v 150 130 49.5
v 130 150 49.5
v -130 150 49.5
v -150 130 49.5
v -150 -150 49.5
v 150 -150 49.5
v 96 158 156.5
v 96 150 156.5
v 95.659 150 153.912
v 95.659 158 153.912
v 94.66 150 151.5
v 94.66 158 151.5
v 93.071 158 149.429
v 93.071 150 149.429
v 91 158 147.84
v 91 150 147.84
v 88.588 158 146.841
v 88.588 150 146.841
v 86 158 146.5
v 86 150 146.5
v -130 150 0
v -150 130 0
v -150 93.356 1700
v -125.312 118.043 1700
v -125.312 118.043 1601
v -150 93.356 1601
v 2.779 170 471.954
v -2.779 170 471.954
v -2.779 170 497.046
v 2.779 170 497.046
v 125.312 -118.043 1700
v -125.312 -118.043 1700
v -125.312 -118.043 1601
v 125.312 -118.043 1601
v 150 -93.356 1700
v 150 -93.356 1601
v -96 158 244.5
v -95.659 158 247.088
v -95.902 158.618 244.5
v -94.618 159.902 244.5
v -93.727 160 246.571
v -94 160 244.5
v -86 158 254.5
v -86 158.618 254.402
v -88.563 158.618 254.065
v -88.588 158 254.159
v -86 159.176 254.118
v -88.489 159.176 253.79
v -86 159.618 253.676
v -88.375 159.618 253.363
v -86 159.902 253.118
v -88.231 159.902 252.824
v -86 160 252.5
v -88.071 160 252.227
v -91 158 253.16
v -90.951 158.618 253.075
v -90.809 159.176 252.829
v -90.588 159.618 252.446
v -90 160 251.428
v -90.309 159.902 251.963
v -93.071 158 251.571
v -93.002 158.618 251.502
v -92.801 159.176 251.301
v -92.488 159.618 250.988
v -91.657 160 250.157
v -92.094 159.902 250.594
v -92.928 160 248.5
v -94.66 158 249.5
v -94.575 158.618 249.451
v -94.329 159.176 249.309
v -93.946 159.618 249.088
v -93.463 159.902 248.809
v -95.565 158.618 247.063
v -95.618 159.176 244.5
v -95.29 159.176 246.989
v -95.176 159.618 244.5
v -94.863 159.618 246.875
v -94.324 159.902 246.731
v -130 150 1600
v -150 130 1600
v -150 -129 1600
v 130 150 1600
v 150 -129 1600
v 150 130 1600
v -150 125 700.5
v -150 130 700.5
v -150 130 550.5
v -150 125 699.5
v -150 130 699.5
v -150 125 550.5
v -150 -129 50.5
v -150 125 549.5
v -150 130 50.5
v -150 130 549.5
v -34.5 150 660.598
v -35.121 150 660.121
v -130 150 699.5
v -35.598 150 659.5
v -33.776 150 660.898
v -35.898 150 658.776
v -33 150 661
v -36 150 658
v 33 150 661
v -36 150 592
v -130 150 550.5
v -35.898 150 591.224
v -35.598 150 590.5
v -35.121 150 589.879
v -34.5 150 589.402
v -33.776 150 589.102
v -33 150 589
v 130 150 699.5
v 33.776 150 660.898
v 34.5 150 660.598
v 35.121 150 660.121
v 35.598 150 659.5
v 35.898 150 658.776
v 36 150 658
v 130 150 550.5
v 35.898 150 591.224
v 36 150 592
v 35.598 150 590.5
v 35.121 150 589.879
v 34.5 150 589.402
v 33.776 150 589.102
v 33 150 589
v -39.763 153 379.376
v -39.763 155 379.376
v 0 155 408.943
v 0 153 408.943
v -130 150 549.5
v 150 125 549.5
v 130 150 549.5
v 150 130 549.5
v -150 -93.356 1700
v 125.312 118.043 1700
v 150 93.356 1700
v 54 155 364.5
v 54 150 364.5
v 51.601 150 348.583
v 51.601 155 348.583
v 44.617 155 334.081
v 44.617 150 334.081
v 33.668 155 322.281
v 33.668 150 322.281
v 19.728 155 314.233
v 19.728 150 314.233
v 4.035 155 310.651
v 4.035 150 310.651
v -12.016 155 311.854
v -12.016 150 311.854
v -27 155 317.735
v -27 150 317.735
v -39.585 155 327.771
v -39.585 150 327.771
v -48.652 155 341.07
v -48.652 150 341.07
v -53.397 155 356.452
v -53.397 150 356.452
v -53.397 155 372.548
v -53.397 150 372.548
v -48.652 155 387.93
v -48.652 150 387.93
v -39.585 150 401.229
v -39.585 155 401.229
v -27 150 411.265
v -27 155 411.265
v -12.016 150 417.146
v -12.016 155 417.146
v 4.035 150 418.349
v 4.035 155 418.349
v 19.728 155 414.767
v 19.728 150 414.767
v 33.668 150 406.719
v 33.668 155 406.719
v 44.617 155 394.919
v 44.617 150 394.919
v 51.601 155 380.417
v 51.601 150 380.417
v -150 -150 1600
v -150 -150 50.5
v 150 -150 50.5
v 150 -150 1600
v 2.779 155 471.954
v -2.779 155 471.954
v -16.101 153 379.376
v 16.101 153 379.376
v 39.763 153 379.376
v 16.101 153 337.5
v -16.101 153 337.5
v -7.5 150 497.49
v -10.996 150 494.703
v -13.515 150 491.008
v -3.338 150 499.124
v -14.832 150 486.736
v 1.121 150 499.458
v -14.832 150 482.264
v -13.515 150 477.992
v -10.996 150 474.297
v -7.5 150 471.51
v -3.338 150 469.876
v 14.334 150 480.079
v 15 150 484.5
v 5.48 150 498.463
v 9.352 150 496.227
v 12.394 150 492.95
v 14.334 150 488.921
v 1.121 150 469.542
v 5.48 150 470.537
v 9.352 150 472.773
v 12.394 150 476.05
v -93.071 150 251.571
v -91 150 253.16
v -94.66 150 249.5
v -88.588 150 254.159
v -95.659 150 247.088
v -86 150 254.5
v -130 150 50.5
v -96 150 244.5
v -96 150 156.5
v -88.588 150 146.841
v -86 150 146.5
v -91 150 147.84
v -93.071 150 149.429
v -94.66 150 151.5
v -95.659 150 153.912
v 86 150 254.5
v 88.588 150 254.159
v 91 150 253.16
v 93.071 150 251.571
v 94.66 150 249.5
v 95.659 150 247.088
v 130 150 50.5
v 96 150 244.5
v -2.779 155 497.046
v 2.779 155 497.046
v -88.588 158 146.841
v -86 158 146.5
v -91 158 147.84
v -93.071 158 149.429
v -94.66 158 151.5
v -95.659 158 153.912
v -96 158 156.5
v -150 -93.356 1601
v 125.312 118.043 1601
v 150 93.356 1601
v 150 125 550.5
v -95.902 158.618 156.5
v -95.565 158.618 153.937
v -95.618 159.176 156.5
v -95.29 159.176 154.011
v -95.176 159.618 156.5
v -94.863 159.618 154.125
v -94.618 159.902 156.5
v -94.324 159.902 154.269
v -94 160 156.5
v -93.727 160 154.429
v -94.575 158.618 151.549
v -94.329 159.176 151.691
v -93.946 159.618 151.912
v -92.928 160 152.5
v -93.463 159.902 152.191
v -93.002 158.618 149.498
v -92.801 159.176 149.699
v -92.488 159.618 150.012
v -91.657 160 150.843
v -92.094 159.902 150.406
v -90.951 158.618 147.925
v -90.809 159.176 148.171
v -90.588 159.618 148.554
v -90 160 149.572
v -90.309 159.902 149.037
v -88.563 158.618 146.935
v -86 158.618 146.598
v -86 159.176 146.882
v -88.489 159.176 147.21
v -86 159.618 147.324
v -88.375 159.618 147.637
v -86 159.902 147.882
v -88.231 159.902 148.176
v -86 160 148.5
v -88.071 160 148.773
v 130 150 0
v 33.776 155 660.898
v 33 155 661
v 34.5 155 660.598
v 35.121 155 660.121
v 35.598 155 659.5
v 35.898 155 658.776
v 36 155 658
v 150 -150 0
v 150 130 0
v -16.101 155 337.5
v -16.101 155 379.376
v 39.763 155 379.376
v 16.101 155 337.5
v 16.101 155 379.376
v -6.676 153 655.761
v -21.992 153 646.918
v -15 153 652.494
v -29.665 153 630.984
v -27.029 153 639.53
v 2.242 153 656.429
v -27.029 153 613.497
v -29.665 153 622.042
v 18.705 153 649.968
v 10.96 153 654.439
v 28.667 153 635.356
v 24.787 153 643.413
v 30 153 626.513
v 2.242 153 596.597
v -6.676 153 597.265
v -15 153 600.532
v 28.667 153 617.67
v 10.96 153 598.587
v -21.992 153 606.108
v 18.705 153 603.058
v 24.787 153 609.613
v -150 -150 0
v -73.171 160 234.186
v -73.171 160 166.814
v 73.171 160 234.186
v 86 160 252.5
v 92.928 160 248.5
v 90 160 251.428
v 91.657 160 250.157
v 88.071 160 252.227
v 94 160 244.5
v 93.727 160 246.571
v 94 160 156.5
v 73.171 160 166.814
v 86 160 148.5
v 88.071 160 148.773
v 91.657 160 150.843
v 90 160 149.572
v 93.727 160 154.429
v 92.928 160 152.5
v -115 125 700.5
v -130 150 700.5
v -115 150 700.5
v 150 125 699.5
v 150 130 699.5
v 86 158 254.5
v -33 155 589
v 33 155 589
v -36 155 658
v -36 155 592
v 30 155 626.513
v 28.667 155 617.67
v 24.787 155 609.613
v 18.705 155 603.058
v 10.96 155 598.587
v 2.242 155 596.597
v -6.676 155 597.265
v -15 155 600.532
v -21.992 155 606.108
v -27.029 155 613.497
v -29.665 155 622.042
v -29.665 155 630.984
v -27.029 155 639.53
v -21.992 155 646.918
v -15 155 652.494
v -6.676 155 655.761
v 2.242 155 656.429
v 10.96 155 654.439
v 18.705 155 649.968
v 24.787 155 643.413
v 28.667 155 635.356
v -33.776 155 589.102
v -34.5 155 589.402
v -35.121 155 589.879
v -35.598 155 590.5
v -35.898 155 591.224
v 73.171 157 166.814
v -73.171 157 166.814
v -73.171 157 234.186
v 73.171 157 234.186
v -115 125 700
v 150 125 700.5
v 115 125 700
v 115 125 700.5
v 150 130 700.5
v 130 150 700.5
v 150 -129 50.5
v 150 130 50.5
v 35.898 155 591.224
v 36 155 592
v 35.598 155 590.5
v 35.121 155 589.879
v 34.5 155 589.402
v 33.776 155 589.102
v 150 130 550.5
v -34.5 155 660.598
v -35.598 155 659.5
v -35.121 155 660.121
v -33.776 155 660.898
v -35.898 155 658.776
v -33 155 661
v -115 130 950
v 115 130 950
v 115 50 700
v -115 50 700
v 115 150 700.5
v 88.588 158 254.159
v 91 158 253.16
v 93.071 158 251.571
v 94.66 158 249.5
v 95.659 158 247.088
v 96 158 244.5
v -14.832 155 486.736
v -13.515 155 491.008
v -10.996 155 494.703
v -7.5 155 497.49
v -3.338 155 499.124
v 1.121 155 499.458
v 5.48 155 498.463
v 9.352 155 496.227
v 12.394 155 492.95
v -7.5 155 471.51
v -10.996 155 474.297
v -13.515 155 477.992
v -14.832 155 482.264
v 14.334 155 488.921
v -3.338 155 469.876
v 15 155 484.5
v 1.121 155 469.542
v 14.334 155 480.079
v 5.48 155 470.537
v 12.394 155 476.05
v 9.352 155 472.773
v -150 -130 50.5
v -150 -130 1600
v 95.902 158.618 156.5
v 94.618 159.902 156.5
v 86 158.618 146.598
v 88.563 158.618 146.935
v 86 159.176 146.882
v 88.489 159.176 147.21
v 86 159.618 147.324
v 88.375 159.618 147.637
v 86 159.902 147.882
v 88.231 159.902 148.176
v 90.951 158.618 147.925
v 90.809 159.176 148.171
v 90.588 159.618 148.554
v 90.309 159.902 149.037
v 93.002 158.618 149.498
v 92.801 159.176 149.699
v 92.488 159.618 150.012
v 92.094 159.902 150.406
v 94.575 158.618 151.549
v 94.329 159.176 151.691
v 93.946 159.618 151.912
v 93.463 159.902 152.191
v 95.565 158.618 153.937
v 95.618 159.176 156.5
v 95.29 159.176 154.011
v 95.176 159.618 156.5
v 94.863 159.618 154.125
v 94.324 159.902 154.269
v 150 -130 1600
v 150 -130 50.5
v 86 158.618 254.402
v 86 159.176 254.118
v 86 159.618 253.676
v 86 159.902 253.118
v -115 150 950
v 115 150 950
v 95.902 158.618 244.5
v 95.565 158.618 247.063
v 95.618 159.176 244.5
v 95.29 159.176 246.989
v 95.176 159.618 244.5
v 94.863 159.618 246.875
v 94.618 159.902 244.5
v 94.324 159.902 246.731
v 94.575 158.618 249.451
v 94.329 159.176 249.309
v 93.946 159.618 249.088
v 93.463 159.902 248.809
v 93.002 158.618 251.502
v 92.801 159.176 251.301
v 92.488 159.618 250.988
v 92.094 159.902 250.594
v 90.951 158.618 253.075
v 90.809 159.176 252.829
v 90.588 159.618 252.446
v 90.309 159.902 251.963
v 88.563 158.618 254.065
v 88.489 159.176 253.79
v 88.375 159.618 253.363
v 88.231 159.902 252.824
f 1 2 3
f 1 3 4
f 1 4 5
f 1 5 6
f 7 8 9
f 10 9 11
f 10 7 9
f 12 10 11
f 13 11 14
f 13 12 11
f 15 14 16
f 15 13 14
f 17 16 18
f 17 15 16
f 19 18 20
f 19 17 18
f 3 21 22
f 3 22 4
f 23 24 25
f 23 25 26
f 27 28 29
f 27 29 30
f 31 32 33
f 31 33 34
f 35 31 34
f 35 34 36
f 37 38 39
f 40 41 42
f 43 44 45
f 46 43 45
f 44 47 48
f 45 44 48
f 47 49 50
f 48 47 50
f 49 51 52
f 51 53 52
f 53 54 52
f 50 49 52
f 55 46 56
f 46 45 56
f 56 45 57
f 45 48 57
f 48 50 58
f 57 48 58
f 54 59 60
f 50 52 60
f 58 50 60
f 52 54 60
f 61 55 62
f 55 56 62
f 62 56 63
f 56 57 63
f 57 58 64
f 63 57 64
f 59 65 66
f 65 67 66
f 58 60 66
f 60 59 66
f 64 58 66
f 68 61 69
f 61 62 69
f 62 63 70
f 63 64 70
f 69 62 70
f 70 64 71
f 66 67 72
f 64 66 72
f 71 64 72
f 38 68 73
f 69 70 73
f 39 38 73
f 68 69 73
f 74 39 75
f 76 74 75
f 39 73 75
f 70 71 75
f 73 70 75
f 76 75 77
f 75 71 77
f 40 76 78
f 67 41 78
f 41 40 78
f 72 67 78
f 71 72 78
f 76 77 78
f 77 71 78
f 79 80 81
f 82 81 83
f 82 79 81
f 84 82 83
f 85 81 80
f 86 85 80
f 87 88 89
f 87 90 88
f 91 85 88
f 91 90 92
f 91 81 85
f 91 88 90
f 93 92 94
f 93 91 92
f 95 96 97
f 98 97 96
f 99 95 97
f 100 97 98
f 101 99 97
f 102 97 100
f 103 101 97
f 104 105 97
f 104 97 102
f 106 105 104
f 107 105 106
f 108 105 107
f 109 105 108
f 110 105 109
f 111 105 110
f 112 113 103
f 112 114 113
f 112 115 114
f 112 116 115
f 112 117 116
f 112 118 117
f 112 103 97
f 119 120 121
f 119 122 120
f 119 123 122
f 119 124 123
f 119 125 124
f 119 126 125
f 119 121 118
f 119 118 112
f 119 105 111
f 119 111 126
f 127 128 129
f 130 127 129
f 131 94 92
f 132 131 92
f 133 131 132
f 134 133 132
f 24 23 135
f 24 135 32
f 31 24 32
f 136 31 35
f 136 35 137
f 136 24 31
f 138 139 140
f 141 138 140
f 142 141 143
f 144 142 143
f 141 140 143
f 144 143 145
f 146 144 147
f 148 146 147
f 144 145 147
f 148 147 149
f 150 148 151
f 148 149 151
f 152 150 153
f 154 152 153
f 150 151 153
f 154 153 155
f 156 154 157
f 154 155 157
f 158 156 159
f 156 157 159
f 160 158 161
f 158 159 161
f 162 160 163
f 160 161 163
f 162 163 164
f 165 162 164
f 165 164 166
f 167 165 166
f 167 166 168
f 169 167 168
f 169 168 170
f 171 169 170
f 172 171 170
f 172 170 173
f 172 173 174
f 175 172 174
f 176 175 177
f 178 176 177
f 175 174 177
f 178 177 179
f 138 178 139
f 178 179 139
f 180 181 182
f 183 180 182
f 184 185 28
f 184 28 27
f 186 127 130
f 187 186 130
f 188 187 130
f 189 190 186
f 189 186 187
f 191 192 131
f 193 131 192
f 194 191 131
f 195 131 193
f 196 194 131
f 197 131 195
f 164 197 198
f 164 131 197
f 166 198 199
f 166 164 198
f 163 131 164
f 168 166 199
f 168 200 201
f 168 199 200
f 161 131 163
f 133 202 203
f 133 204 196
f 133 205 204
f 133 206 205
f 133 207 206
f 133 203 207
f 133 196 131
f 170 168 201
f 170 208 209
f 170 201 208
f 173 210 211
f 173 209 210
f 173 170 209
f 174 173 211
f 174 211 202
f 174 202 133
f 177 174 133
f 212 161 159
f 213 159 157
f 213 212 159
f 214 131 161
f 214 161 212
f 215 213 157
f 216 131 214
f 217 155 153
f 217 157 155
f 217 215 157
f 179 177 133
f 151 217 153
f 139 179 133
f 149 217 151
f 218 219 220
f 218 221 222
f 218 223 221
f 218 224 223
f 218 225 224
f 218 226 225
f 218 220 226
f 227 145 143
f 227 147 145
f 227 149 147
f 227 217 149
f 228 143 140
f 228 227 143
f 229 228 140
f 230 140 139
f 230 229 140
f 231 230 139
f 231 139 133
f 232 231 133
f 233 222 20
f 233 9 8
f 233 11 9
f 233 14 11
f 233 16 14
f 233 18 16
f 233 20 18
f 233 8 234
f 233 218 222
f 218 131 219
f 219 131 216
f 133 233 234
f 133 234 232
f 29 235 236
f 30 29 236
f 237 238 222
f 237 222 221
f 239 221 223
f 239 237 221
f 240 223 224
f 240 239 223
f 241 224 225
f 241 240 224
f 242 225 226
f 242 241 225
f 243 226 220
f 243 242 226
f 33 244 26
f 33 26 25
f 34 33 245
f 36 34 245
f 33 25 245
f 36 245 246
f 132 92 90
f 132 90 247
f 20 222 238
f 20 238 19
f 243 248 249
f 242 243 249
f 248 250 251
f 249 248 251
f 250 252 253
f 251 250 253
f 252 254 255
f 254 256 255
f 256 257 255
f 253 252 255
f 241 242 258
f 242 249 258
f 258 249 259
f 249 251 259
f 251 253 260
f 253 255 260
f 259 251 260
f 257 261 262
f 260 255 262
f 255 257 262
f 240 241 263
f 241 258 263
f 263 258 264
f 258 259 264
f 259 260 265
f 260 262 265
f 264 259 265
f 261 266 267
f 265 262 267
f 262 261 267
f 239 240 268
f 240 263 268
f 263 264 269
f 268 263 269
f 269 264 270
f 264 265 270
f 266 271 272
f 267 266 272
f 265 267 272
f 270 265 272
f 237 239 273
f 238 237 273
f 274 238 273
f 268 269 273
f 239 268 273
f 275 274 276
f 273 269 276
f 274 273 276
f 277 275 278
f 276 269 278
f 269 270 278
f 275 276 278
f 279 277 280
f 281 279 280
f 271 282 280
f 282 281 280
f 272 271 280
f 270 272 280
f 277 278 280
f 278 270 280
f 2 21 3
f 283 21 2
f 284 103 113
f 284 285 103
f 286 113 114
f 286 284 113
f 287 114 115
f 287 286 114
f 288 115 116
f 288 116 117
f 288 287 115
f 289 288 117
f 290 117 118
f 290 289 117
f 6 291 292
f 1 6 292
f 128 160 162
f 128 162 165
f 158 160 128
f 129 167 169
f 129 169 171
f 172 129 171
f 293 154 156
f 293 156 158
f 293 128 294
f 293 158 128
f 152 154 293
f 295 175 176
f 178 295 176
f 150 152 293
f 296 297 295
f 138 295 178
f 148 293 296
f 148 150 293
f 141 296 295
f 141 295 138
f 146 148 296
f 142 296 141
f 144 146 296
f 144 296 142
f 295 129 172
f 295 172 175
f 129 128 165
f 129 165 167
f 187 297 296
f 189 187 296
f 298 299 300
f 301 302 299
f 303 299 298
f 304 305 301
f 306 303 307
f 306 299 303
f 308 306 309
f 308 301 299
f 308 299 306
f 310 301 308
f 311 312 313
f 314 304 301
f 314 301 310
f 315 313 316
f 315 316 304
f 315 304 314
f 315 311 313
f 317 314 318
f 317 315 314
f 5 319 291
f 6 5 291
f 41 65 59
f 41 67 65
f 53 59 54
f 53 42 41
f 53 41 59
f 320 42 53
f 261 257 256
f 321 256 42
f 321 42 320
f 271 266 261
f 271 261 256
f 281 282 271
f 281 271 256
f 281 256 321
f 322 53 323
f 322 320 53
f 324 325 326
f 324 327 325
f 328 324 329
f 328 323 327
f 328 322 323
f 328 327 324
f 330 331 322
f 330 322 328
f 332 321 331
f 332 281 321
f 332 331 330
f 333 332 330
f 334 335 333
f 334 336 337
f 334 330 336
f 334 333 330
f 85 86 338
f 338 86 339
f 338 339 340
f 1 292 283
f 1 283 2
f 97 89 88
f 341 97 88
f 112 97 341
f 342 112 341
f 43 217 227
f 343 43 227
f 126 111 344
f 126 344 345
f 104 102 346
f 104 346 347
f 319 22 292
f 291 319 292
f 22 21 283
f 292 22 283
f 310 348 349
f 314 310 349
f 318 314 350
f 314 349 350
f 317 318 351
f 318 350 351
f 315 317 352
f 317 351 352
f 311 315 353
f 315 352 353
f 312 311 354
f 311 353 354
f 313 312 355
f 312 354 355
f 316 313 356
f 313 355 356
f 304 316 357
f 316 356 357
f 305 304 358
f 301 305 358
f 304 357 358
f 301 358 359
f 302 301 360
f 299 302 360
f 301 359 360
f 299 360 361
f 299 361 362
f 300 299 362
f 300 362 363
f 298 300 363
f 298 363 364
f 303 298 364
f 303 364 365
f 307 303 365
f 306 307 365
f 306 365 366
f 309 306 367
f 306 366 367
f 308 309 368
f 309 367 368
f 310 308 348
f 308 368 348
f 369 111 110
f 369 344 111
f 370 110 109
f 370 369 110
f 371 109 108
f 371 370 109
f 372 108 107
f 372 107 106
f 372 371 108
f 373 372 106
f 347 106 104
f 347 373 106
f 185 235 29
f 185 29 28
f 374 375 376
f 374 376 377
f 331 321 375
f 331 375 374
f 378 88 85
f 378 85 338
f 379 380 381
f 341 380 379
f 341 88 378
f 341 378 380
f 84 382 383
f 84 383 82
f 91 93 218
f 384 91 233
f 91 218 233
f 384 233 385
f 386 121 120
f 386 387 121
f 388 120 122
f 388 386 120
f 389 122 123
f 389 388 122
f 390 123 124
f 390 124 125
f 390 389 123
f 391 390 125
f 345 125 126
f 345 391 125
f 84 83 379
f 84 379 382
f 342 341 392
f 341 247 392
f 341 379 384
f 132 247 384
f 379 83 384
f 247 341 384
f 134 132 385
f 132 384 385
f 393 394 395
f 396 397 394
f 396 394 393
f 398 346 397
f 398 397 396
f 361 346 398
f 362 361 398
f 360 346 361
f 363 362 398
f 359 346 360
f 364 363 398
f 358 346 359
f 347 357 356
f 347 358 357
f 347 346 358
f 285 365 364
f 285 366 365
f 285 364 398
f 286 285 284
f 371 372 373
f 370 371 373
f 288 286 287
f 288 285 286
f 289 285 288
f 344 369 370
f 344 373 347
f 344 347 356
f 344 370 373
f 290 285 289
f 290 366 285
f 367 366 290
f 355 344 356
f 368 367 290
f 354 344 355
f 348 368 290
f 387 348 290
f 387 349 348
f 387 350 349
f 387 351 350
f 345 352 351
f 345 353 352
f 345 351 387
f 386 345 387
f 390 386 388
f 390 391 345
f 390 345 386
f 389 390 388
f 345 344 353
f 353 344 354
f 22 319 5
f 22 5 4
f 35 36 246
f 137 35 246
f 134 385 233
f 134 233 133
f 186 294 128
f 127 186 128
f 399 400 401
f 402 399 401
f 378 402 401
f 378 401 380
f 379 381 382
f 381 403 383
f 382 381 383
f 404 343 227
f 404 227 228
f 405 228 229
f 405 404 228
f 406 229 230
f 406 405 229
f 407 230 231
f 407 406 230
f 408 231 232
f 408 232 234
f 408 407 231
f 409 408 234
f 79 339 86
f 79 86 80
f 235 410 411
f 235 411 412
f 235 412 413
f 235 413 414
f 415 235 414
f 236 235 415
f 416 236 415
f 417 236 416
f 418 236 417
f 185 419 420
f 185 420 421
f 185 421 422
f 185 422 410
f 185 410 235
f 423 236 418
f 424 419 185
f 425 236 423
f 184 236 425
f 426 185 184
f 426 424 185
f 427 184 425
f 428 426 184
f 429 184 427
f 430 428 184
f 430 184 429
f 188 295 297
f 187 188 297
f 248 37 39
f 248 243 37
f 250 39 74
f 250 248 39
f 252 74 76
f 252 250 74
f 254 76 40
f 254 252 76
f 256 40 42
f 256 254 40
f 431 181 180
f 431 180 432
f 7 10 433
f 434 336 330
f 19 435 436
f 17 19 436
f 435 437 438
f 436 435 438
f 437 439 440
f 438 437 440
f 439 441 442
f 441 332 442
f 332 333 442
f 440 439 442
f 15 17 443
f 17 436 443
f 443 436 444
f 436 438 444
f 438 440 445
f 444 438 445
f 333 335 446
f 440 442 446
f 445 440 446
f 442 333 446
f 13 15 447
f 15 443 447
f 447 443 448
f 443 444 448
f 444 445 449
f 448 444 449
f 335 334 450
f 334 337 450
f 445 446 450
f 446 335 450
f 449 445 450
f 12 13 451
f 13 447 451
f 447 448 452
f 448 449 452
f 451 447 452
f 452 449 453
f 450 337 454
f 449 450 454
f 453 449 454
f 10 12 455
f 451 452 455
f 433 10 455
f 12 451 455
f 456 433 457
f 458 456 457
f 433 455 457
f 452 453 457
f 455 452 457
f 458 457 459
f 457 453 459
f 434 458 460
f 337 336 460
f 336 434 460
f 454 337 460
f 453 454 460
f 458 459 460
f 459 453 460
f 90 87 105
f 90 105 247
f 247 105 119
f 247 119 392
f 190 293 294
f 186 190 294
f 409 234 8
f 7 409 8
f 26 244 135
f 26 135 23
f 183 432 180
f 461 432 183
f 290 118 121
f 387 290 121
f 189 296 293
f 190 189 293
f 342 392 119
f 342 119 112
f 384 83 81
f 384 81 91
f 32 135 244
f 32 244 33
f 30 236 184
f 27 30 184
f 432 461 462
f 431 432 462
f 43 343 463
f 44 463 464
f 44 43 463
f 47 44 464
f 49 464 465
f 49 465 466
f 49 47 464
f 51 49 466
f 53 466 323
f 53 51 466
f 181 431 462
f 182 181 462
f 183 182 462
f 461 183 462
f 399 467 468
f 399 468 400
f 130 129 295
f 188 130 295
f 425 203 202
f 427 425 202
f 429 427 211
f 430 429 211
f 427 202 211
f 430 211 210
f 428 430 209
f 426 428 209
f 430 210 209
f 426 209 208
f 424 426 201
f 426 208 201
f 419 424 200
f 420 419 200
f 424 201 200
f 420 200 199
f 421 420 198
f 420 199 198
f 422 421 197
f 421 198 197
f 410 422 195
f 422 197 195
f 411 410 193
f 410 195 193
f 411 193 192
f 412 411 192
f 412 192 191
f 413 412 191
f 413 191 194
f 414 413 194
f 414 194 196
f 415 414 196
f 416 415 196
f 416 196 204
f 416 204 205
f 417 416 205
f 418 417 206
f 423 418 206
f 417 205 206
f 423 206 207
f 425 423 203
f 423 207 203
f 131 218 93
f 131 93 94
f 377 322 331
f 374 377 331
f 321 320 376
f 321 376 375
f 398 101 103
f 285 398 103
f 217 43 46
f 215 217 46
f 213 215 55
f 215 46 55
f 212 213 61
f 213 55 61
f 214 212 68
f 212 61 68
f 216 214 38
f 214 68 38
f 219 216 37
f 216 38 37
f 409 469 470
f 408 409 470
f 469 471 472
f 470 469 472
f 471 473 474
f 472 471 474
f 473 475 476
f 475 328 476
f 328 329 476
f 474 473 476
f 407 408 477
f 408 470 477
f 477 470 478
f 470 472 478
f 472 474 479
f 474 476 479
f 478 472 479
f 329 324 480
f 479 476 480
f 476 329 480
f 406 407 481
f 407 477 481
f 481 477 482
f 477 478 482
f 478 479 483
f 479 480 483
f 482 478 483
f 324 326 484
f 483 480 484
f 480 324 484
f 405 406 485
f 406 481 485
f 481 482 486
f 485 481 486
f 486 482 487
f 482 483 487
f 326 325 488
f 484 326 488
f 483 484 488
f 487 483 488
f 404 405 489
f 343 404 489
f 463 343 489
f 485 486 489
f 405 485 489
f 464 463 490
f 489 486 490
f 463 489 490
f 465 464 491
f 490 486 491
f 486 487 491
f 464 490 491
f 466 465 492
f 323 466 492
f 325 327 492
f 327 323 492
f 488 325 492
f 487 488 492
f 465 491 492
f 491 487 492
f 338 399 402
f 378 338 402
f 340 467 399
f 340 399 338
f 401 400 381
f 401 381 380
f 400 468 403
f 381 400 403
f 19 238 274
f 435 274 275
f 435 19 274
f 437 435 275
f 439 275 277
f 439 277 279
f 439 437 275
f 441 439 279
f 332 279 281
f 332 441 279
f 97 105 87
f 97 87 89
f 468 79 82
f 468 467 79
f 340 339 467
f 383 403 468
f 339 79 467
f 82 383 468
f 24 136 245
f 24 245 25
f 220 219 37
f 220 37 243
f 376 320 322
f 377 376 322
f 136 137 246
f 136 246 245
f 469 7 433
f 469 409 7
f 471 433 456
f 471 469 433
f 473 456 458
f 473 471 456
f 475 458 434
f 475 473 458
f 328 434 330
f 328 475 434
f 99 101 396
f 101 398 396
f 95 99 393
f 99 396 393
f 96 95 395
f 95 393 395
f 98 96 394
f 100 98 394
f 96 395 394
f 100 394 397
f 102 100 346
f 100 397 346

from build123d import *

# Parameters (mm, degrees)
SKETCH_1_W             = 300
SKETCH_1_H             = 300
EXTRUDE_1_DEPTH        = 1700
SKETCH_2_W             = 300
SKETCH_2_H             = 1
CUT_EXTRUDE_1_DEPTH    = 1800
CUT_EXTRUDE_2_DEPTH    = 100
CHAMFER_1_SIZE         = 20
SKETCH_5_W             = 477.672274662
SKETCH_5_H             = 1
CUT_EXTRUDE_3_DEPTH    = 331
SKETCH_6_W             = 1549.5
SKETCH_6_H             = 1
CUT_EXTRUDE_4_DEPTH    = 331
CUT_EXTRUDE_5_DEPTH    = 115
SKETCH_8_W             = 546.124938844
SKETCH_8_H             = 1
CUT_EXTRUDE_6_DEPTH    = 25
PATTERN_LINEAR_1_COUNT = 2
PATTERN_LINEAR_1_PITCH = 150
SKETCH_9_W             = 192
SKETCH_9_H             = 108
EXTRUDE_2_DEPTH        = 10
FILLET_1_R             = 10
FILLET_2_R             = 2
SKETCH_10_W            = 146.342820748
SKETCH_10_H            = 67.37146225
CUT_EXTRUDE_7_DEPTH    = 3
SKETCH_11_W            = 72
SKETCH_11_H            = 72
EXTRUDE_3_DEPTH        = 5
FILLET_3_R             = 3
SKETCH_12_R            = 30
CUT_EXTRUDE_8_DEPTH    = 2
SKETCH_13_R            = 54
SKETCH_13_R_2          = 15
EXTRUDE_4_DEPTH        = 5
SKETCH_14_W            = 5.558591624
SKETCH_14_H            = 25.092991566
EXTRUDE_5_DEPTH        = 15
CUT_EXTRUDE_9_DEPTH    = 2


with BuildPart() as part:
    # 草图1 → 凸台-拉伸1 (new body)
    with BuildSketch(Plane.XY):
        Rectangle(SKETCH_1_W, SKETCH_1_H)
    extrude(amount=EXTRUDE_1_DEPTH)

    # 草图2 → 切除-拉伸1 (cut)
    with BuildSketch(Plane(origin=(0, 150, 0), x_dir=(1, 0, 0), z_dir=(0, 1, 0))):
        with Locations((0, -1600.5)):
            Rectangle(SKETCH_2_W, SKETCH_2_H)
    extrude(amount=-CUT_EXTRUDE_1_DEPTH, mode=Mode.SUBTRACT)

    # 草图3 → 切除-拉伸2 (cut)
    with BuildSketch(Plane.XY.offset(1700)):
        Polygon((150, -93.355636265), (236.579596326, -93.355636265), (236.579596326, -247.079729733), (-236.579596326, -247.079729733), (-236.579596326, -93.355636265), (-150, -93.355636265), (-125.312415712, -118.043220553), (125.312415712, -118.043220553), align=None)
        Polygon((-150, 93.355636265), (-236.579596326, 93.355636265), (-236.579596326, 247.079729733), (236.579596326, 247.079729733), (236.579596326, 93.355636265), (150, 93.355636265), (125.312415712, 118.043220553), (-125.312415712, 118.043220553), align=None)
    extrude(amount=-CUT_EXTRUDE_2_DEPTH, mode=Mode.SUBTRACT)

    # 倒角1
    chamfer_1_edges = [part.edges().sort_by_distance(p)[0] for p in [
        (150, 150, 800),
        (-150, 150, 800),
    ]]
    chamfer(chamfer_1_edges, length=CHAMFER_1_SIZE)

    # 草图5 → 切除-拉伸3 (cut)
    with BuildSketch(Plane(origin=(0, 150, 0), x_dir=(1, 0, 0), z_dir=(0, 1, 0))):
        with Locations((0, -50)):
            Rectangle(SKETCH_5_W, SKETCH_5_H)
    extrude(amount=-CUT_EXTRUDE_3_DEPTH, mode=Mode.SUBTRACT)

    # 草图6 → 切除-拉伸4 (cut)
    with BuildSketch(Plane(origin=(150, 0, 0), x_dir=(0, 0, -1), z_dir=(1, 0, 0))):
        with Locations((-825.25, -129.5)):
            Rectangle(SKETCH_6_W, SKETCH_6_H)
    extrude(amount=-CUT_EXTRUDE_4_DEPTH, mode=Mode.SUBTRACT)

    # 草图7 → 切除-拉伸5 (cut, symmetric)
    with BuildSketch(Plane(origin=(0, 0, 0), x_dir=(0, 0, -1), z_dir=(1, 0, 0))):
        Polygon((-700, 150), (-950, 150), (-950, 130), (-700, 50), align=None)
    extrude(amount=CUT_EXTRUDE_5_DEPTH, both=True, mode=Mode.SUBTRACT)

    # 草图8 → 切除-拉伸6 (cut)
    with BuildSketch(Plane(origin=(0, 150, 0), x_dir=(1, 0, 0), z_dir=(0, 1, 0))):
        with Locations((0, -550)):
            Rectangle(SKETCH_8_W, SKETCH_8_H)
    cut_extrude_6 = extrude(amount=-CUT_EXTRUDE_6_DEPTH, mode=Mode.SUBTRACT)

    # 阵列(线性)1: 切除-拉伸6 ×2
    with Locations(*[(0, 0, i * PATTERN_LINEAR_1_PITCH) for i in range(1, PATTERN_LINEAR_1_COUNT)]):
        add(cut_extrude_6, mode=Mode.SUBTRACT)

    # 草图9 → 凸台-拉伸2 (add)
    with BuildSketch(Plane(origin=(0, 150, 0), x_dir=(1, 0, 0), z_dir=(0, 1, 0))):
        with Locations((0, -200.5)):
            Rectangle(SKETCH_9_W, SKETCH_9_H)
    extrude(amount=EXTRUDE_2_DEPTH)

    # 圆角1
    fillet_1_edges = [part.edges().sort_by_distance(p)[0] for p in [
        (96, 155, 254.5),
        (96, 155, 146.5),
        (-96, 155, 146.5),
        (-96, 155, 254.5),
    ]]
    fillet(fillet_1_edges, radius=FILLET_1_R)

    # 圆角2
    fillet_2_edges = [part.edges().sort_by_distance(p)[0] for p in [
        (-96, 160, 200.5),
        (0, 160, 146.5),
        (96, 160, 200.5),
        (0, 160, 254.5),
        (93.071067812, 160, 149.428932188),
        (93.071067812, 160, 251.571067812),
        (-93.071067812, 160, 251.571067812),
        (-93.071067812, 160, 149.428932188),
    ]]
    fillet(fillet_2_edges, radius=FILLET_2_R)

    # 草图10 → 切除-拉伸7 (cut)
    with BuildSketch(Plane(origin=(0, 160, 0), x_dir=(1, 0, 0), z_dir=(0, 1, 0))):
        with Locations((0, -200.5)):
            Rectangle(SKETCH_10_W, SKETCH_10_H)
    extrude(amount=-CUT_EXTRUDE_7_DEPTH, mode=Mode.SUBTRACT)

    # 草图11 → 凸台-拉伸3 (add)
    with BuildSketch(Plane(origin=(0, 150, 0), x_dir=(1, 0, 0), z_dir=(0, 1, 0))):
        with Locations((0, -625)):
            Rectangle(SKETCH_11_W, SKETCH_11_H)
    extrude(amount=EXTRUDE_3_DEPTH)

    # 圆角3
    fillet_3_edges = [part.edges().sort_by_distance(p)[0] for p in [
        (36, 152.5, 661),
        (36, 152.5, 589),
        (-36, 152.5, 589),
        (-36, 152.5, 661),
    ]]
    fillet(fillet_3_edges, radius=FILLET_3_R)

    # 草图12 → 切除-拉伸8 (cut)
    with BuildSketch(Plane(origin=(0, 155, 0), x_dir=(1, 0, 0), z_dir=(0, 1, 0))):
        with Locations((0, -626.513071867)):
            Circle(SKETCH_12_R)
    extrude(amount=-CUT_EXTRUDE_8_DEPTH, mode=Mode.SUBTRACT)

    # 草图13 → 凸台-拉伸4 (add)
    with BuildSketch(Plane(origin=(0, 150, 0), x_dir=(1, 0, 0), z_dir=(0, 1, 0))):
        with Locations((0, -364.5)):
            Circle(SKETCH_13_R)
        with Locations((0, -484.5)):
            Circle(SKETCH_13_R_2)
    extrude(amount=EXTRUDE_4_DEPTH)

    # 草图14 → 凸台-拉伸5 (add)
    with BuildSketch(Plane(origin=(0, 155, 0), x_dir=(1, 0, 0), z_dir=(0, 1, 0))):
        with Locations((0, -484.5)):
            Rectangle(SKETCH_14_W, SKETCH_14_H)
    extrude(amount=EXTRUDE_5_DEPTH)

    # 草图15 → 切除-拉伸9 (cut)
    with BuildSketch(Plane(origin=(0, 155, 0), x_dir=(1, 0, 0), z_dir=(0, 1, 0))):
        Polygon((16.100670748, -337.5), (-16.100670748, -337.5), (-16.100670748, -379.375728248), (-39.763314653, -379.375728248), (0, -408.943051302), (39.763314653, -379.375728248), (16.100670748, -379.375728248), align=None)
    extrude(amount=-CUT_EXTRUDE_9_DEPTH, mode=Mode.SUBTRACT)


solid = part.part
